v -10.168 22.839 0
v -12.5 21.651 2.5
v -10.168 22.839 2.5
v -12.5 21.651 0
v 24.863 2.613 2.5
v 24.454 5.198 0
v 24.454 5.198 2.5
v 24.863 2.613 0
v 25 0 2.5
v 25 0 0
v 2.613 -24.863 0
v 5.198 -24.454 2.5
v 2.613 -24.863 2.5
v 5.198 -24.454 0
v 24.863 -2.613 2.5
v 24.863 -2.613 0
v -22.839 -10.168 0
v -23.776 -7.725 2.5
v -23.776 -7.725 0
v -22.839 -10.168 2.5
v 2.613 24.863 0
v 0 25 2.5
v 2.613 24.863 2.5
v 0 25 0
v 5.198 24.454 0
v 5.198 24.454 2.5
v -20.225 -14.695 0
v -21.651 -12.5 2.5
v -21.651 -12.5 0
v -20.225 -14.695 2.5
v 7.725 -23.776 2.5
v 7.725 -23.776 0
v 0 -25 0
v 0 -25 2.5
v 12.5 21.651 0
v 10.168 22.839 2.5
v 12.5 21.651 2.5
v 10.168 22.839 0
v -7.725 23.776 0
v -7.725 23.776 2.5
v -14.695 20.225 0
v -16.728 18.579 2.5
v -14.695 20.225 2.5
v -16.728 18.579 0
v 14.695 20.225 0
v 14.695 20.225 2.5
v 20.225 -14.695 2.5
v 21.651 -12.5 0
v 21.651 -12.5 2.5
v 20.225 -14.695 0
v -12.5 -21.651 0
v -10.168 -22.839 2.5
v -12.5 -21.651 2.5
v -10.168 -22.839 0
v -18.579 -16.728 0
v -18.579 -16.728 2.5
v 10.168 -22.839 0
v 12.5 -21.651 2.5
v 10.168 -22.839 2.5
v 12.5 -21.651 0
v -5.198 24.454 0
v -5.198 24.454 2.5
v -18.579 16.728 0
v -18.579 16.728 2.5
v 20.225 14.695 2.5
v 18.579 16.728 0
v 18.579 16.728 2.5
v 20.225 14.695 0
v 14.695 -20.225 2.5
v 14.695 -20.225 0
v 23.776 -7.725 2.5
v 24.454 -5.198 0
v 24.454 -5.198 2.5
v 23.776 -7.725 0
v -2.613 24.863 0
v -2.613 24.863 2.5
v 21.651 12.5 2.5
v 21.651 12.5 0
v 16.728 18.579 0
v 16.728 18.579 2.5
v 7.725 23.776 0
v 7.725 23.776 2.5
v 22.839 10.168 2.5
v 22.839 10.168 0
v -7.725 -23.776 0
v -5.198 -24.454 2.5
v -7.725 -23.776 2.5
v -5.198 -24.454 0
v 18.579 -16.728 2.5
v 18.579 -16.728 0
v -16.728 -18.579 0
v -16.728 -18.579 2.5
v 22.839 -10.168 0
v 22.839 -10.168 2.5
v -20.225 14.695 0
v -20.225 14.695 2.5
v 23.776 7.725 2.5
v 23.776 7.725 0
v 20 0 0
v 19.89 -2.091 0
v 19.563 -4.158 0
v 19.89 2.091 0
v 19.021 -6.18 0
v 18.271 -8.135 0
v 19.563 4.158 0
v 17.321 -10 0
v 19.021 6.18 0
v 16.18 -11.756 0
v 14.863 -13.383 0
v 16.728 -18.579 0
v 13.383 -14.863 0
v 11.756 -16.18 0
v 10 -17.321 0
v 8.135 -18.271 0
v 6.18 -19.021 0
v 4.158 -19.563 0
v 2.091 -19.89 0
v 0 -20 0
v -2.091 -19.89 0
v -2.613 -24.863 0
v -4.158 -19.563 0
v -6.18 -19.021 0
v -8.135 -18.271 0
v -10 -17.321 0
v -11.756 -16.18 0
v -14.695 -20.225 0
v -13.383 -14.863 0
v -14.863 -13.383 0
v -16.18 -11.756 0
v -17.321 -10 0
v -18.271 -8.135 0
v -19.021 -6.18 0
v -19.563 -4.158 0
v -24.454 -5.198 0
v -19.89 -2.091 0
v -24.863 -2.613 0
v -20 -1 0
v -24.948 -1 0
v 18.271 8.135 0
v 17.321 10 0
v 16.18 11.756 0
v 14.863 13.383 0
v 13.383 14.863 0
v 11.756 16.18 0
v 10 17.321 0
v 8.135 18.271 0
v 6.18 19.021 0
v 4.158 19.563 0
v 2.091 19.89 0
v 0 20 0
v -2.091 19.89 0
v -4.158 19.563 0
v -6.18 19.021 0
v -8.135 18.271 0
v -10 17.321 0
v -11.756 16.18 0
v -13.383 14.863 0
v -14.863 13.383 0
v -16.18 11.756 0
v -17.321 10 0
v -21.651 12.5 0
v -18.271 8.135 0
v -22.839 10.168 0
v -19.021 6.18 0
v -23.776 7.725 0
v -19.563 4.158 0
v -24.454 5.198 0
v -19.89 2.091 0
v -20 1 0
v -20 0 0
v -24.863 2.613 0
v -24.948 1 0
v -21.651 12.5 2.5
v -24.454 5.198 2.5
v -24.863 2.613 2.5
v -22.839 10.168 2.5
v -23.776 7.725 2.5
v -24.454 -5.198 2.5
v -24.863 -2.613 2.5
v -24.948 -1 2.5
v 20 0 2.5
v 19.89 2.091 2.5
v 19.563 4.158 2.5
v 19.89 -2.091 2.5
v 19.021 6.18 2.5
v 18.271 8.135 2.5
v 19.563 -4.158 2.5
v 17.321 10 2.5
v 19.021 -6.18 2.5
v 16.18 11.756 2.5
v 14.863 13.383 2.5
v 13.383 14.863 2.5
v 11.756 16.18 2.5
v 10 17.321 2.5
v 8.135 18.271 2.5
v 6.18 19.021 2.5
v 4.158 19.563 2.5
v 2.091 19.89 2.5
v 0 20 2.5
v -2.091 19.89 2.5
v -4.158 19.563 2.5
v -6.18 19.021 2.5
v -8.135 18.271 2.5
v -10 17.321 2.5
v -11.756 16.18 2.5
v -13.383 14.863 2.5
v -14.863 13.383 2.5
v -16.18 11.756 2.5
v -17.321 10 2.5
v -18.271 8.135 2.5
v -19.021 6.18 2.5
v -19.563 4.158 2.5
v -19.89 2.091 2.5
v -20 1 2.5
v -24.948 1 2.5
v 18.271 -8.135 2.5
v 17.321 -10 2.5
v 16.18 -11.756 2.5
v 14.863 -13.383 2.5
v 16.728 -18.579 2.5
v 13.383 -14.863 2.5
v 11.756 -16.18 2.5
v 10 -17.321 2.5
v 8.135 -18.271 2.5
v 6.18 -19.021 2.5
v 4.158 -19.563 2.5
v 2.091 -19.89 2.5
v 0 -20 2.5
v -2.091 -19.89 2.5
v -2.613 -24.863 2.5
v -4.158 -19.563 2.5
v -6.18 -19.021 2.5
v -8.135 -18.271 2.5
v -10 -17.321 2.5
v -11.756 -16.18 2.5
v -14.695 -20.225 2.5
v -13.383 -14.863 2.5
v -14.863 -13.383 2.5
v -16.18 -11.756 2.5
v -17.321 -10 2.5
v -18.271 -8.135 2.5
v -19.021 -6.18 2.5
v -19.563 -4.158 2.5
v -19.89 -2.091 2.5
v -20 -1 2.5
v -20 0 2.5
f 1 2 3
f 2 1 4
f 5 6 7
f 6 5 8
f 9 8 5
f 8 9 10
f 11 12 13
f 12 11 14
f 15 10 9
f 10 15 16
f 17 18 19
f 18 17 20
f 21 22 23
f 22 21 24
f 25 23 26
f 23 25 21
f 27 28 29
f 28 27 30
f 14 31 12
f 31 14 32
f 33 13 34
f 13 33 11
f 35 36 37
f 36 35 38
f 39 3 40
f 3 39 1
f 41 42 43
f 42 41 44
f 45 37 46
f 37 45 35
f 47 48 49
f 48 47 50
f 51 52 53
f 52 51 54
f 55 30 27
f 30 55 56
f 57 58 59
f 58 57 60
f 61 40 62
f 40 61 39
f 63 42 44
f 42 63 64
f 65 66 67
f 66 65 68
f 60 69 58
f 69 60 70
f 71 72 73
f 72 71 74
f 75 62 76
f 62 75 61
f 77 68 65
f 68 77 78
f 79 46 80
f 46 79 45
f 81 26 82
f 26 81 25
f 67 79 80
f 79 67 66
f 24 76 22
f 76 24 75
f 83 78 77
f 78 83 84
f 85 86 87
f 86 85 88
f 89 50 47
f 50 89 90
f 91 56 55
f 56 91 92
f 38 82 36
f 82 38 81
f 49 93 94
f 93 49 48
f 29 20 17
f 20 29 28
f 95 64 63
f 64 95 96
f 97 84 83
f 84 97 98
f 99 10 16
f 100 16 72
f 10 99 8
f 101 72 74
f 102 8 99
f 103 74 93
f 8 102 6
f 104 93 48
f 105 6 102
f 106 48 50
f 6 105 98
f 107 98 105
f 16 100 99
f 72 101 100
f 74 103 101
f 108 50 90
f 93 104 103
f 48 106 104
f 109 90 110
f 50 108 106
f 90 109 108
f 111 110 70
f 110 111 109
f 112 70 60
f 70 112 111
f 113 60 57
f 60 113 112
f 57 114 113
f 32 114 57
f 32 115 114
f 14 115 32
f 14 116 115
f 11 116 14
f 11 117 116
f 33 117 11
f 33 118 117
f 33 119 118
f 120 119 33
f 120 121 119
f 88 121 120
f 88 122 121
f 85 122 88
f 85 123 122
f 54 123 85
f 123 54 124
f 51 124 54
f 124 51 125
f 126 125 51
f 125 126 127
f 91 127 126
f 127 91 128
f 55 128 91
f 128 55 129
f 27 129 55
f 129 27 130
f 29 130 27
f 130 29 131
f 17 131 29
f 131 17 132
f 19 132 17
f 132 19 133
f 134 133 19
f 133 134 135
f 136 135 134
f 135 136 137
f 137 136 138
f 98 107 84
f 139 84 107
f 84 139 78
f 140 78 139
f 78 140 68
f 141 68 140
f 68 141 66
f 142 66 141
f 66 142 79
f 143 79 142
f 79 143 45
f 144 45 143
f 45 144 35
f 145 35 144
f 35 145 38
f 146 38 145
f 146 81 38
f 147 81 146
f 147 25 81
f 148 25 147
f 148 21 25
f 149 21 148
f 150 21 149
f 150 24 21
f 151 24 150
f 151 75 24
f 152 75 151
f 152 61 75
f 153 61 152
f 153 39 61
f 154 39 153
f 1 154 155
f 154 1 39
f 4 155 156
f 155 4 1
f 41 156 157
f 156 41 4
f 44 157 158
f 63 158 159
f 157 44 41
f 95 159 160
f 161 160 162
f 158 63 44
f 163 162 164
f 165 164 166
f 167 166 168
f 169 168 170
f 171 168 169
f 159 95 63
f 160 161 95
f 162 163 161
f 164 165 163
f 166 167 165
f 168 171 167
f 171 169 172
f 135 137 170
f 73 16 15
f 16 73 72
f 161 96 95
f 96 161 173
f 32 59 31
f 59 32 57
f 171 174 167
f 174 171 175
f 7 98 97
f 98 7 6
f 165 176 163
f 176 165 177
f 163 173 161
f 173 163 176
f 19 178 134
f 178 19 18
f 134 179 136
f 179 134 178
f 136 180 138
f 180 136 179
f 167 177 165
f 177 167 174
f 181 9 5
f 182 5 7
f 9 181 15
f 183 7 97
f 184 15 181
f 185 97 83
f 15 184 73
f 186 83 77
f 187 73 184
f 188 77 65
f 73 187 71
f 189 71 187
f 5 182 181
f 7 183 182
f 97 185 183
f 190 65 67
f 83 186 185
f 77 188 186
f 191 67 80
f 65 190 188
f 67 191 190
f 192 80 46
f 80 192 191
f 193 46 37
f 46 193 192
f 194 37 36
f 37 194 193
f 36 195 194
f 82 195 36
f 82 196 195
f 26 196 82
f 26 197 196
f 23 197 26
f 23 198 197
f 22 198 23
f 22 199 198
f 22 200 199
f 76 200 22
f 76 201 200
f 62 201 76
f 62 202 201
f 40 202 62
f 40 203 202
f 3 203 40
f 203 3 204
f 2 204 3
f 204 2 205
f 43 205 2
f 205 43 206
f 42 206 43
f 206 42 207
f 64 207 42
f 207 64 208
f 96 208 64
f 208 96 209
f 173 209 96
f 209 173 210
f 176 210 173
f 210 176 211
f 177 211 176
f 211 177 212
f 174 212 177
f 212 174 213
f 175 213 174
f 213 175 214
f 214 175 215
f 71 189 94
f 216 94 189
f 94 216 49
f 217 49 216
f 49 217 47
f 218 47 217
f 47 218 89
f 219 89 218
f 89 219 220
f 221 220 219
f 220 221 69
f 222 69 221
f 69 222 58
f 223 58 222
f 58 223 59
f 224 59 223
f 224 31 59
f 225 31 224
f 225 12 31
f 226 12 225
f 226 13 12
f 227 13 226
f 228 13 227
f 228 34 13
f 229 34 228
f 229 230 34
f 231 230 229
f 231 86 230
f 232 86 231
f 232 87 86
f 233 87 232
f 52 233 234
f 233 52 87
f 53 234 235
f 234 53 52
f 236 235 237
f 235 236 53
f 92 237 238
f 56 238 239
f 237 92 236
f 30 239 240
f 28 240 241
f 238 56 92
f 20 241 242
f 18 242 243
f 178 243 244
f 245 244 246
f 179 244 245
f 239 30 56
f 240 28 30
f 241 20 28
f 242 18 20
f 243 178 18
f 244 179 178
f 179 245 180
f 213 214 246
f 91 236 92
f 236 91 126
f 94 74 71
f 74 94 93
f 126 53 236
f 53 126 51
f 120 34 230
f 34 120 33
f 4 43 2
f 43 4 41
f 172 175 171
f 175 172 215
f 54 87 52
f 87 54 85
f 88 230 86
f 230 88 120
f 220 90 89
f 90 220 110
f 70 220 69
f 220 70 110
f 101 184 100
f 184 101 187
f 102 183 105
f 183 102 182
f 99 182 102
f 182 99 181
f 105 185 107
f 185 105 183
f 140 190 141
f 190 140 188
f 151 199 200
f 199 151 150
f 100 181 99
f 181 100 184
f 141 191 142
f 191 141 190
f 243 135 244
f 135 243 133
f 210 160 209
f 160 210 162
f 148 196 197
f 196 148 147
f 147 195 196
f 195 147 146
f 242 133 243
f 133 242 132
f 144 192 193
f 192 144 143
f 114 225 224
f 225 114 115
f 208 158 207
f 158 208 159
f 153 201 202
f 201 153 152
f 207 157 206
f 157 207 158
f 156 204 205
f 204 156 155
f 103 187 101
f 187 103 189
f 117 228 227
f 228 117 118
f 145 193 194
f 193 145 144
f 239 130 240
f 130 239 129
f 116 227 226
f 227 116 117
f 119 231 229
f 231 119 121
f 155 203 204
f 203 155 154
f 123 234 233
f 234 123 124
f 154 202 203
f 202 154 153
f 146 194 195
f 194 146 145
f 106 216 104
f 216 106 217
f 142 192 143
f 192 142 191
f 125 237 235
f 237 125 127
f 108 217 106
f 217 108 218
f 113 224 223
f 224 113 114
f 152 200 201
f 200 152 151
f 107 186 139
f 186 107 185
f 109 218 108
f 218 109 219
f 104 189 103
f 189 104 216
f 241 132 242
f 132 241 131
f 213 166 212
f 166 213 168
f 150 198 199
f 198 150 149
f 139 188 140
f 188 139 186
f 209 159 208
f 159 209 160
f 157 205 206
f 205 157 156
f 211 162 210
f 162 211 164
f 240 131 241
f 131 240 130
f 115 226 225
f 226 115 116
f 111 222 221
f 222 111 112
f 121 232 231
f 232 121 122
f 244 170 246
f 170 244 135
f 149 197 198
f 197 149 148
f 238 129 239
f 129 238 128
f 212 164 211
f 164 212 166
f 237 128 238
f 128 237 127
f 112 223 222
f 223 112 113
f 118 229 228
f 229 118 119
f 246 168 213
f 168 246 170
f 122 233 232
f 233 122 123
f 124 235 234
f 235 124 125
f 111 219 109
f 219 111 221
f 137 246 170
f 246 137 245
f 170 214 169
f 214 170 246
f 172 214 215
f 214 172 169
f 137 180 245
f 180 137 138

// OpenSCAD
// Internal retaining ring.
$fn = 60;
eps = 0.02;
inner_d = 40;
outer_d = 50;
thickness = max(2.5, 1.5);
difference() { cylinder(d=outer_d,h=thickness); translate([0,0,-eps]) cylinder(d=inner_d,h=thickness+2*eps); translate([-outer_d/2-eps,-1,-eps]) cube([outer_d/2-inner_d/2+eps,2,thickness+2*eps]); }
